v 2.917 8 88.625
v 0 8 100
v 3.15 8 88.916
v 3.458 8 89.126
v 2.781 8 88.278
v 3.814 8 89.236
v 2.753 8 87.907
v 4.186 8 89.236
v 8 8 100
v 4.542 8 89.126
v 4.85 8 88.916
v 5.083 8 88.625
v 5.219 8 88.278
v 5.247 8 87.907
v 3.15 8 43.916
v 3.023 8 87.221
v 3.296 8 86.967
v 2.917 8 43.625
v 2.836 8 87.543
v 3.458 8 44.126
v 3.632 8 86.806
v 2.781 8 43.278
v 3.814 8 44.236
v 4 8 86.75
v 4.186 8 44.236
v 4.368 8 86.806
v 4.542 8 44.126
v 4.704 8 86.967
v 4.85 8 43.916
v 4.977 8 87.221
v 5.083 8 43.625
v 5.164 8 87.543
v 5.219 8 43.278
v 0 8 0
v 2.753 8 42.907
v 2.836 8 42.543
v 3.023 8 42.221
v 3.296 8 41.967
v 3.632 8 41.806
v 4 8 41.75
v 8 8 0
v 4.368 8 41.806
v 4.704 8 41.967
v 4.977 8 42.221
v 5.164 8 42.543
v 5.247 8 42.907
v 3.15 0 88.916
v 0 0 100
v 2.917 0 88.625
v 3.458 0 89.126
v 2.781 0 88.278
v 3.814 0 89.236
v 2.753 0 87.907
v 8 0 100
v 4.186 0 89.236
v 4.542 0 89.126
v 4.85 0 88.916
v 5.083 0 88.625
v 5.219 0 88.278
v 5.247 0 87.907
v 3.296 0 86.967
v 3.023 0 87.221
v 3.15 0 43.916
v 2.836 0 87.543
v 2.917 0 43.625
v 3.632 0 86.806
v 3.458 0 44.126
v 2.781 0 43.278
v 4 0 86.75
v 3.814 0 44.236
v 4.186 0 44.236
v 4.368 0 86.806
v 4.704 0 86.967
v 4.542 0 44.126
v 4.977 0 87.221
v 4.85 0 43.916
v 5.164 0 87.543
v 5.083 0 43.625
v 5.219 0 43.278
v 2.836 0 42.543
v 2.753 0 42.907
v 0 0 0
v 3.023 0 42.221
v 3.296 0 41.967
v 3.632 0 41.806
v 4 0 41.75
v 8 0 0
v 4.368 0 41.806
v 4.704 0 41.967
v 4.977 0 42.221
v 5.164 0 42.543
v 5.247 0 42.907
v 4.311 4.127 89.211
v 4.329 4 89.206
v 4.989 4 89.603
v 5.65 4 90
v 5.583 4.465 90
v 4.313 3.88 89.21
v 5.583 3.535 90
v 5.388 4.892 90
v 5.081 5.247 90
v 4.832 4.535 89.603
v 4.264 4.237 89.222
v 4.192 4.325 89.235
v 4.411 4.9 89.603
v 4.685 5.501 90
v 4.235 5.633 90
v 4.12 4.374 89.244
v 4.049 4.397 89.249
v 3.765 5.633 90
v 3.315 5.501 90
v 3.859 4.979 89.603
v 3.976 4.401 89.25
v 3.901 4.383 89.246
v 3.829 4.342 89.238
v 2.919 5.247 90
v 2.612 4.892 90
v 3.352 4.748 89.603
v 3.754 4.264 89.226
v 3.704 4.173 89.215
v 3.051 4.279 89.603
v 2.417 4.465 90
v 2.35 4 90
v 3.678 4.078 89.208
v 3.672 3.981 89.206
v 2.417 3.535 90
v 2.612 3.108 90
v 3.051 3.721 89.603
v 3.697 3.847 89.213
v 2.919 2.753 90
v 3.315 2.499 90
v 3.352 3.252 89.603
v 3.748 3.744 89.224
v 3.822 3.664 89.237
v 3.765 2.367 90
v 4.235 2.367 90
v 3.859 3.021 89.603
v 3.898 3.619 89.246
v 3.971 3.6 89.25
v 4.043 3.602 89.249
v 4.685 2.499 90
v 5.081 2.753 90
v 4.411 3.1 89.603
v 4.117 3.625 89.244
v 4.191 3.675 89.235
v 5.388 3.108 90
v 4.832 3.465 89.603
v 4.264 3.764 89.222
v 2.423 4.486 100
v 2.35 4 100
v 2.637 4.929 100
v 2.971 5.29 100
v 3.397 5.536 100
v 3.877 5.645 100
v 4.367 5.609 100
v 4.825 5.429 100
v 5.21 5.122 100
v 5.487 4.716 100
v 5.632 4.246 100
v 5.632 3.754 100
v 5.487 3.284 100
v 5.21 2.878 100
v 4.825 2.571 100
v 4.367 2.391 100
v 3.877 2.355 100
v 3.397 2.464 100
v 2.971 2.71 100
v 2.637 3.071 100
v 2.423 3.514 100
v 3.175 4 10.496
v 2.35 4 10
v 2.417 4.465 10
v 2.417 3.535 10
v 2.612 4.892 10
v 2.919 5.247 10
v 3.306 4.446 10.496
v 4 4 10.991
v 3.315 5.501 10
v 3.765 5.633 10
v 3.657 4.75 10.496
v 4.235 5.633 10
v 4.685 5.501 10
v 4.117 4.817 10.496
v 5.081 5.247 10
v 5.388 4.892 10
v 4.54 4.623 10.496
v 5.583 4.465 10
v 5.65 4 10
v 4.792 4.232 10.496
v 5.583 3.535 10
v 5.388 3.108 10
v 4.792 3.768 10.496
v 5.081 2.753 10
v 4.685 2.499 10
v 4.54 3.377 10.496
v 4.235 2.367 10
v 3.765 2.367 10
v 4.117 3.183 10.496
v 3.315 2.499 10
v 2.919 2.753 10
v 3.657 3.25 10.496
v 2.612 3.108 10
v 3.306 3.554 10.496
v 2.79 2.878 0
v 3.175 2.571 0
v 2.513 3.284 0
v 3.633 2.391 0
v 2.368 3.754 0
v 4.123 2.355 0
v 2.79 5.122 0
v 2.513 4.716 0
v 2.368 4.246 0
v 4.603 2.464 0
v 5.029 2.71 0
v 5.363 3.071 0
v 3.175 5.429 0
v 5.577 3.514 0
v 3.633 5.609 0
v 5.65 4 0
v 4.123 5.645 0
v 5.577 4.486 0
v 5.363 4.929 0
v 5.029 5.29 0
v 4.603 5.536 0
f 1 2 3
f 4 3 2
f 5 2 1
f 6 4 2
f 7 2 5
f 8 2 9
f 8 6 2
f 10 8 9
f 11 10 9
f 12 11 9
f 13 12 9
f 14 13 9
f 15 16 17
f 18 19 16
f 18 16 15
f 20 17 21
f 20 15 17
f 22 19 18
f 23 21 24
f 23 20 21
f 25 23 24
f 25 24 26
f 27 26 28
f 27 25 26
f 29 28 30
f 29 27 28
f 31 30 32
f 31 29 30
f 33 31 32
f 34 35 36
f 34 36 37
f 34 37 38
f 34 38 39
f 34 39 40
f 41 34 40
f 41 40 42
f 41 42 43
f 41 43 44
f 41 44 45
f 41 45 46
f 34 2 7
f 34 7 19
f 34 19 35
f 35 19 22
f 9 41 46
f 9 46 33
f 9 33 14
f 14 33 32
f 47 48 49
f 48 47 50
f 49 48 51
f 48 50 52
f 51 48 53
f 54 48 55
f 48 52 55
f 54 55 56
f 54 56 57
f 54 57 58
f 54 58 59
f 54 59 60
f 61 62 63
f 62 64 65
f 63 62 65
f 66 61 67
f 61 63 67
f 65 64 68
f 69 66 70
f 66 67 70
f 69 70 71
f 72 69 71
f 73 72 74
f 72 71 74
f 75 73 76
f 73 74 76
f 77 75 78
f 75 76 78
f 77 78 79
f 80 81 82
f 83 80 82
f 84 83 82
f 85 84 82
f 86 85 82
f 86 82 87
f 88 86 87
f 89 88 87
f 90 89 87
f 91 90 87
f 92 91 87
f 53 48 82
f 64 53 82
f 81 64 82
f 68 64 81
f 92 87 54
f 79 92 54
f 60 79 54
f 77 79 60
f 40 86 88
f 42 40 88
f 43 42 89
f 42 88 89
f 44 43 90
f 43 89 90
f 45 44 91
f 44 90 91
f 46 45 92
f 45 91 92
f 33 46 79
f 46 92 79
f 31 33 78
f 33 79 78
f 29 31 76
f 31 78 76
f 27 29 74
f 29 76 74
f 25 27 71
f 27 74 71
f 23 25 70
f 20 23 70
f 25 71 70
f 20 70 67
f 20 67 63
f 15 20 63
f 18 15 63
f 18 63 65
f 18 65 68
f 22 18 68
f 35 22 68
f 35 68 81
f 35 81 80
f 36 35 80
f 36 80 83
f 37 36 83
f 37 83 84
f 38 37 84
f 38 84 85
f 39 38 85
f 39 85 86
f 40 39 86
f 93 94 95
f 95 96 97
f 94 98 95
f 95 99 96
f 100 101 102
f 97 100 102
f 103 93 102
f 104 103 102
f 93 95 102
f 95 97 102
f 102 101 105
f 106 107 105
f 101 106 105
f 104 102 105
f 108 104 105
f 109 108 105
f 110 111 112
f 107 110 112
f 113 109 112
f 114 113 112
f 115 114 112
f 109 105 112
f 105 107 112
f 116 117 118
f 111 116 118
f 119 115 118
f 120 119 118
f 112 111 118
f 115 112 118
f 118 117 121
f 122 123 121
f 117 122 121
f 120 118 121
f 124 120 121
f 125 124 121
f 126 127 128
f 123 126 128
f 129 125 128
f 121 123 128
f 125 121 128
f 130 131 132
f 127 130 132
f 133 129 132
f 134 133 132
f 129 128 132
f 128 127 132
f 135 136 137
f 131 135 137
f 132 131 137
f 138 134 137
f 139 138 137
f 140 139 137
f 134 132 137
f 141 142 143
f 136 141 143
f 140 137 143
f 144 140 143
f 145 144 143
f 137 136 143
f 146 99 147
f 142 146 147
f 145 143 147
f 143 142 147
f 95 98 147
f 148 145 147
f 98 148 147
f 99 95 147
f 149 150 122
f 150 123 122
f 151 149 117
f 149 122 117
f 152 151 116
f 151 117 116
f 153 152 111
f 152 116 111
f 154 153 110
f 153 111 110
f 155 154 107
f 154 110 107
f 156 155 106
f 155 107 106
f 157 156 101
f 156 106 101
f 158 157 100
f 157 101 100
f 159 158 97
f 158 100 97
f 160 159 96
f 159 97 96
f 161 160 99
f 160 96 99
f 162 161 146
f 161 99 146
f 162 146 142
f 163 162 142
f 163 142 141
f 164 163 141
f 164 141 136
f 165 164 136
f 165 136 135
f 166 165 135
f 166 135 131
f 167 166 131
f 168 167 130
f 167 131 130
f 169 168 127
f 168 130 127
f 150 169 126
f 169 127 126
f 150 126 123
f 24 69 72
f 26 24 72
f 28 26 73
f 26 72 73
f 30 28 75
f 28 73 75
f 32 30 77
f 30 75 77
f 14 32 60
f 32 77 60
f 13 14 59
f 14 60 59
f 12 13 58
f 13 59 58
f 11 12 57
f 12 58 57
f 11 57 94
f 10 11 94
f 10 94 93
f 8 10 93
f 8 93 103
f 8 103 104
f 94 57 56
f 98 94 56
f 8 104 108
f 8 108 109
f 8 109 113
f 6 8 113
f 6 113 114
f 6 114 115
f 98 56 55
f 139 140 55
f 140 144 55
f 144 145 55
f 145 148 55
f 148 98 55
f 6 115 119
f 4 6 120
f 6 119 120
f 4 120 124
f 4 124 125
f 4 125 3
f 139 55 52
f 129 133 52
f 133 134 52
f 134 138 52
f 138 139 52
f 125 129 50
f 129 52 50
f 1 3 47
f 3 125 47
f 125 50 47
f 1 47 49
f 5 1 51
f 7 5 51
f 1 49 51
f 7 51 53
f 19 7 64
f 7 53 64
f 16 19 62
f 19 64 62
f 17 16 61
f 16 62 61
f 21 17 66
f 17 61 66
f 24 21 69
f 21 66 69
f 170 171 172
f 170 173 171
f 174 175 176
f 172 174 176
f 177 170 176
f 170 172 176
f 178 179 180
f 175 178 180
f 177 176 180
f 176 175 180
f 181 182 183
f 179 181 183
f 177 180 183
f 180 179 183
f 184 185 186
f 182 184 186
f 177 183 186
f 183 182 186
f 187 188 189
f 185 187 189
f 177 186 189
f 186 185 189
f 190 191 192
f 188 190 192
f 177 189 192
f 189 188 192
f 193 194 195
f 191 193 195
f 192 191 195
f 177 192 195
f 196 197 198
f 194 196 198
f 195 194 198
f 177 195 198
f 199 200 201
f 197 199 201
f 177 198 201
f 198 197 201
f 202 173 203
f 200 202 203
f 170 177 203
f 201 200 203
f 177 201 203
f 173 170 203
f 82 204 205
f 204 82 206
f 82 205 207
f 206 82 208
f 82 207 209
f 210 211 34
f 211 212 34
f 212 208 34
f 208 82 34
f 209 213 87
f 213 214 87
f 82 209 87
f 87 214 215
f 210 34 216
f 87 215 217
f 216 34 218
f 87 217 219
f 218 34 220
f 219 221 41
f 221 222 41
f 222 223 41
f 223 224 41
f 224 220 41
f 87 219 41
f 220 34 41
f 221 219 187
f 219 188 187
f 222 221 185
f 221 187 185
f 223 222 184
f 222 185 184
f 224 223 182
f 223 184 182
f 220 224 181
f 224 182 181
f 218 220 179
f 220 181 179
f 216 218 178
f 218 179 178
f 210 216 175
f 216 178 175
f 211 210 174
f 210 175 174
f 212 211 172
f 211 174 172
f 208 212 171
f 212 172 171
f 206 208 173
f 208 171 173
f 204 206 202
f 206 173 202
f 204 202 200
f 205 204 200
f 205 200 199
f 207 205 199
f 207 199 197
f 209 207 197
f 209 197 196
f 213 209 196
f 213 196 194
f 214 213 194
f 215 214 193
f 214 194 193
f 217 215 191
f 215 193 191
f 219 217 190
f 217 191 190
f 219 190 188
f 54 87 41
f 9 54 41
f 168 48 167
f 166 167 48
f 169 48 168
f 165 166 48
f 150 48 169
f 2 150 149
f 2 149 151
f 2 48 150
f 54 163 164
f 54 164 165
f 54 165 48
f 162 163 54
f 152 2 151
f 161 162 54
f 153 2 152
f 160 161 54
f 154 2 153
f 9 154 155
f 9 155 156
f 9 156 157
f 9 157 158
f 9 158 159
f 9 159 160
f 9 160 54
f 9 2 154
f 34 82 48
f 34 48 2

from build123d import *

# Parameters (mm, degrees)
SKETCH1_W                       = 8
SKETCH1_H                       = 8
EXTRUDE1_DEPTH                  = 100
M3_TAPPED_HOLE1_D               = 2.5
M4_TAPPED_HOLE1_D               = 3.3
M4_TAPPED_HOLE1_DEPTH           = 10
M4_TAPPED_HOLE1_TIP             = 0.991420021
M4_TAPPED_HOLE1_ON_FACE_2_D     = 3.3
M4_TAPPED_HOLE1_ON_FACE_2_DEPTH = 10
M4_TAPPED_HOLE1_ON_FACE_2_TIP   = 0.991420021


with BuildPart() as part:
    # Sketch1 → Extrude1 (new body)
    with BuildSketch(Plane.XY):
        with Locations((4, 4)):
            Rectangle(SKETCH1_W, SKETCH1_H)
    extrude(amount=EXTRUDE1_DEPTH)

    # M3 Tapped Hole1 (through all)
    with Locations(Plane(origin=(4, 8, 88), x_dir=(0, 0, 1), z_dir=(0, 1, 0))):
        with Locations((0, 0), (-45, 0)):
            Hole(M3_TAPPED_HOLE1_D / 2)

    # M4 Tapped Hole1
    with Locations(Plane(origin=(4, 4, 100), x_dir=(1, 0, 0), z_dir=(0, 0, 1))):
        with Locations((0, 0)):
            Hole(M4_TAPPED_HOLE1_D / 2, depth=M4_TAPPED_HOLE1_DEPTH)
            with Locations((0, 0, -(M4_TAPPED_HOLE1_DEPTH + M4_TAPPED_HOLE1_TIP / 2))):  # 118° drill point
                Cone(0, M4_TAPPED_HOLE1_D / 2, M4_TAPPED_HOLE1_TIP, mode=Mode.SUBTRACT)

    # M4 Tapped Hole1 on face 2
    with Locations(Plane(origin=(4, 4, 0), x_dir=(-1, 0, 0), z_dir=(0, 0, -1))):
        with Locations((0, 0)):
            Hole(M4_TAPPED_HOLE1_ON_FACE_2_D / 2, depth=M4_TAPPED_HOLE1_ON_FACE_2_DEPTH)
            with Locations((0, 0, -(M4_TAPPED_HOLE1_ON_FACE_2_DEPTH + M4_TAPPED_HOLE1_ON_FACE_2_TIP / 2))):  # 118° drill point
                Cone(0, M4_TAPPED_HOLE1_ON_FACE_2_D / 2, M4_TAPPED_HOLE1_ON_FACE_2_TIP, mode=Mode.SUBTRACT)


solid = part.part
